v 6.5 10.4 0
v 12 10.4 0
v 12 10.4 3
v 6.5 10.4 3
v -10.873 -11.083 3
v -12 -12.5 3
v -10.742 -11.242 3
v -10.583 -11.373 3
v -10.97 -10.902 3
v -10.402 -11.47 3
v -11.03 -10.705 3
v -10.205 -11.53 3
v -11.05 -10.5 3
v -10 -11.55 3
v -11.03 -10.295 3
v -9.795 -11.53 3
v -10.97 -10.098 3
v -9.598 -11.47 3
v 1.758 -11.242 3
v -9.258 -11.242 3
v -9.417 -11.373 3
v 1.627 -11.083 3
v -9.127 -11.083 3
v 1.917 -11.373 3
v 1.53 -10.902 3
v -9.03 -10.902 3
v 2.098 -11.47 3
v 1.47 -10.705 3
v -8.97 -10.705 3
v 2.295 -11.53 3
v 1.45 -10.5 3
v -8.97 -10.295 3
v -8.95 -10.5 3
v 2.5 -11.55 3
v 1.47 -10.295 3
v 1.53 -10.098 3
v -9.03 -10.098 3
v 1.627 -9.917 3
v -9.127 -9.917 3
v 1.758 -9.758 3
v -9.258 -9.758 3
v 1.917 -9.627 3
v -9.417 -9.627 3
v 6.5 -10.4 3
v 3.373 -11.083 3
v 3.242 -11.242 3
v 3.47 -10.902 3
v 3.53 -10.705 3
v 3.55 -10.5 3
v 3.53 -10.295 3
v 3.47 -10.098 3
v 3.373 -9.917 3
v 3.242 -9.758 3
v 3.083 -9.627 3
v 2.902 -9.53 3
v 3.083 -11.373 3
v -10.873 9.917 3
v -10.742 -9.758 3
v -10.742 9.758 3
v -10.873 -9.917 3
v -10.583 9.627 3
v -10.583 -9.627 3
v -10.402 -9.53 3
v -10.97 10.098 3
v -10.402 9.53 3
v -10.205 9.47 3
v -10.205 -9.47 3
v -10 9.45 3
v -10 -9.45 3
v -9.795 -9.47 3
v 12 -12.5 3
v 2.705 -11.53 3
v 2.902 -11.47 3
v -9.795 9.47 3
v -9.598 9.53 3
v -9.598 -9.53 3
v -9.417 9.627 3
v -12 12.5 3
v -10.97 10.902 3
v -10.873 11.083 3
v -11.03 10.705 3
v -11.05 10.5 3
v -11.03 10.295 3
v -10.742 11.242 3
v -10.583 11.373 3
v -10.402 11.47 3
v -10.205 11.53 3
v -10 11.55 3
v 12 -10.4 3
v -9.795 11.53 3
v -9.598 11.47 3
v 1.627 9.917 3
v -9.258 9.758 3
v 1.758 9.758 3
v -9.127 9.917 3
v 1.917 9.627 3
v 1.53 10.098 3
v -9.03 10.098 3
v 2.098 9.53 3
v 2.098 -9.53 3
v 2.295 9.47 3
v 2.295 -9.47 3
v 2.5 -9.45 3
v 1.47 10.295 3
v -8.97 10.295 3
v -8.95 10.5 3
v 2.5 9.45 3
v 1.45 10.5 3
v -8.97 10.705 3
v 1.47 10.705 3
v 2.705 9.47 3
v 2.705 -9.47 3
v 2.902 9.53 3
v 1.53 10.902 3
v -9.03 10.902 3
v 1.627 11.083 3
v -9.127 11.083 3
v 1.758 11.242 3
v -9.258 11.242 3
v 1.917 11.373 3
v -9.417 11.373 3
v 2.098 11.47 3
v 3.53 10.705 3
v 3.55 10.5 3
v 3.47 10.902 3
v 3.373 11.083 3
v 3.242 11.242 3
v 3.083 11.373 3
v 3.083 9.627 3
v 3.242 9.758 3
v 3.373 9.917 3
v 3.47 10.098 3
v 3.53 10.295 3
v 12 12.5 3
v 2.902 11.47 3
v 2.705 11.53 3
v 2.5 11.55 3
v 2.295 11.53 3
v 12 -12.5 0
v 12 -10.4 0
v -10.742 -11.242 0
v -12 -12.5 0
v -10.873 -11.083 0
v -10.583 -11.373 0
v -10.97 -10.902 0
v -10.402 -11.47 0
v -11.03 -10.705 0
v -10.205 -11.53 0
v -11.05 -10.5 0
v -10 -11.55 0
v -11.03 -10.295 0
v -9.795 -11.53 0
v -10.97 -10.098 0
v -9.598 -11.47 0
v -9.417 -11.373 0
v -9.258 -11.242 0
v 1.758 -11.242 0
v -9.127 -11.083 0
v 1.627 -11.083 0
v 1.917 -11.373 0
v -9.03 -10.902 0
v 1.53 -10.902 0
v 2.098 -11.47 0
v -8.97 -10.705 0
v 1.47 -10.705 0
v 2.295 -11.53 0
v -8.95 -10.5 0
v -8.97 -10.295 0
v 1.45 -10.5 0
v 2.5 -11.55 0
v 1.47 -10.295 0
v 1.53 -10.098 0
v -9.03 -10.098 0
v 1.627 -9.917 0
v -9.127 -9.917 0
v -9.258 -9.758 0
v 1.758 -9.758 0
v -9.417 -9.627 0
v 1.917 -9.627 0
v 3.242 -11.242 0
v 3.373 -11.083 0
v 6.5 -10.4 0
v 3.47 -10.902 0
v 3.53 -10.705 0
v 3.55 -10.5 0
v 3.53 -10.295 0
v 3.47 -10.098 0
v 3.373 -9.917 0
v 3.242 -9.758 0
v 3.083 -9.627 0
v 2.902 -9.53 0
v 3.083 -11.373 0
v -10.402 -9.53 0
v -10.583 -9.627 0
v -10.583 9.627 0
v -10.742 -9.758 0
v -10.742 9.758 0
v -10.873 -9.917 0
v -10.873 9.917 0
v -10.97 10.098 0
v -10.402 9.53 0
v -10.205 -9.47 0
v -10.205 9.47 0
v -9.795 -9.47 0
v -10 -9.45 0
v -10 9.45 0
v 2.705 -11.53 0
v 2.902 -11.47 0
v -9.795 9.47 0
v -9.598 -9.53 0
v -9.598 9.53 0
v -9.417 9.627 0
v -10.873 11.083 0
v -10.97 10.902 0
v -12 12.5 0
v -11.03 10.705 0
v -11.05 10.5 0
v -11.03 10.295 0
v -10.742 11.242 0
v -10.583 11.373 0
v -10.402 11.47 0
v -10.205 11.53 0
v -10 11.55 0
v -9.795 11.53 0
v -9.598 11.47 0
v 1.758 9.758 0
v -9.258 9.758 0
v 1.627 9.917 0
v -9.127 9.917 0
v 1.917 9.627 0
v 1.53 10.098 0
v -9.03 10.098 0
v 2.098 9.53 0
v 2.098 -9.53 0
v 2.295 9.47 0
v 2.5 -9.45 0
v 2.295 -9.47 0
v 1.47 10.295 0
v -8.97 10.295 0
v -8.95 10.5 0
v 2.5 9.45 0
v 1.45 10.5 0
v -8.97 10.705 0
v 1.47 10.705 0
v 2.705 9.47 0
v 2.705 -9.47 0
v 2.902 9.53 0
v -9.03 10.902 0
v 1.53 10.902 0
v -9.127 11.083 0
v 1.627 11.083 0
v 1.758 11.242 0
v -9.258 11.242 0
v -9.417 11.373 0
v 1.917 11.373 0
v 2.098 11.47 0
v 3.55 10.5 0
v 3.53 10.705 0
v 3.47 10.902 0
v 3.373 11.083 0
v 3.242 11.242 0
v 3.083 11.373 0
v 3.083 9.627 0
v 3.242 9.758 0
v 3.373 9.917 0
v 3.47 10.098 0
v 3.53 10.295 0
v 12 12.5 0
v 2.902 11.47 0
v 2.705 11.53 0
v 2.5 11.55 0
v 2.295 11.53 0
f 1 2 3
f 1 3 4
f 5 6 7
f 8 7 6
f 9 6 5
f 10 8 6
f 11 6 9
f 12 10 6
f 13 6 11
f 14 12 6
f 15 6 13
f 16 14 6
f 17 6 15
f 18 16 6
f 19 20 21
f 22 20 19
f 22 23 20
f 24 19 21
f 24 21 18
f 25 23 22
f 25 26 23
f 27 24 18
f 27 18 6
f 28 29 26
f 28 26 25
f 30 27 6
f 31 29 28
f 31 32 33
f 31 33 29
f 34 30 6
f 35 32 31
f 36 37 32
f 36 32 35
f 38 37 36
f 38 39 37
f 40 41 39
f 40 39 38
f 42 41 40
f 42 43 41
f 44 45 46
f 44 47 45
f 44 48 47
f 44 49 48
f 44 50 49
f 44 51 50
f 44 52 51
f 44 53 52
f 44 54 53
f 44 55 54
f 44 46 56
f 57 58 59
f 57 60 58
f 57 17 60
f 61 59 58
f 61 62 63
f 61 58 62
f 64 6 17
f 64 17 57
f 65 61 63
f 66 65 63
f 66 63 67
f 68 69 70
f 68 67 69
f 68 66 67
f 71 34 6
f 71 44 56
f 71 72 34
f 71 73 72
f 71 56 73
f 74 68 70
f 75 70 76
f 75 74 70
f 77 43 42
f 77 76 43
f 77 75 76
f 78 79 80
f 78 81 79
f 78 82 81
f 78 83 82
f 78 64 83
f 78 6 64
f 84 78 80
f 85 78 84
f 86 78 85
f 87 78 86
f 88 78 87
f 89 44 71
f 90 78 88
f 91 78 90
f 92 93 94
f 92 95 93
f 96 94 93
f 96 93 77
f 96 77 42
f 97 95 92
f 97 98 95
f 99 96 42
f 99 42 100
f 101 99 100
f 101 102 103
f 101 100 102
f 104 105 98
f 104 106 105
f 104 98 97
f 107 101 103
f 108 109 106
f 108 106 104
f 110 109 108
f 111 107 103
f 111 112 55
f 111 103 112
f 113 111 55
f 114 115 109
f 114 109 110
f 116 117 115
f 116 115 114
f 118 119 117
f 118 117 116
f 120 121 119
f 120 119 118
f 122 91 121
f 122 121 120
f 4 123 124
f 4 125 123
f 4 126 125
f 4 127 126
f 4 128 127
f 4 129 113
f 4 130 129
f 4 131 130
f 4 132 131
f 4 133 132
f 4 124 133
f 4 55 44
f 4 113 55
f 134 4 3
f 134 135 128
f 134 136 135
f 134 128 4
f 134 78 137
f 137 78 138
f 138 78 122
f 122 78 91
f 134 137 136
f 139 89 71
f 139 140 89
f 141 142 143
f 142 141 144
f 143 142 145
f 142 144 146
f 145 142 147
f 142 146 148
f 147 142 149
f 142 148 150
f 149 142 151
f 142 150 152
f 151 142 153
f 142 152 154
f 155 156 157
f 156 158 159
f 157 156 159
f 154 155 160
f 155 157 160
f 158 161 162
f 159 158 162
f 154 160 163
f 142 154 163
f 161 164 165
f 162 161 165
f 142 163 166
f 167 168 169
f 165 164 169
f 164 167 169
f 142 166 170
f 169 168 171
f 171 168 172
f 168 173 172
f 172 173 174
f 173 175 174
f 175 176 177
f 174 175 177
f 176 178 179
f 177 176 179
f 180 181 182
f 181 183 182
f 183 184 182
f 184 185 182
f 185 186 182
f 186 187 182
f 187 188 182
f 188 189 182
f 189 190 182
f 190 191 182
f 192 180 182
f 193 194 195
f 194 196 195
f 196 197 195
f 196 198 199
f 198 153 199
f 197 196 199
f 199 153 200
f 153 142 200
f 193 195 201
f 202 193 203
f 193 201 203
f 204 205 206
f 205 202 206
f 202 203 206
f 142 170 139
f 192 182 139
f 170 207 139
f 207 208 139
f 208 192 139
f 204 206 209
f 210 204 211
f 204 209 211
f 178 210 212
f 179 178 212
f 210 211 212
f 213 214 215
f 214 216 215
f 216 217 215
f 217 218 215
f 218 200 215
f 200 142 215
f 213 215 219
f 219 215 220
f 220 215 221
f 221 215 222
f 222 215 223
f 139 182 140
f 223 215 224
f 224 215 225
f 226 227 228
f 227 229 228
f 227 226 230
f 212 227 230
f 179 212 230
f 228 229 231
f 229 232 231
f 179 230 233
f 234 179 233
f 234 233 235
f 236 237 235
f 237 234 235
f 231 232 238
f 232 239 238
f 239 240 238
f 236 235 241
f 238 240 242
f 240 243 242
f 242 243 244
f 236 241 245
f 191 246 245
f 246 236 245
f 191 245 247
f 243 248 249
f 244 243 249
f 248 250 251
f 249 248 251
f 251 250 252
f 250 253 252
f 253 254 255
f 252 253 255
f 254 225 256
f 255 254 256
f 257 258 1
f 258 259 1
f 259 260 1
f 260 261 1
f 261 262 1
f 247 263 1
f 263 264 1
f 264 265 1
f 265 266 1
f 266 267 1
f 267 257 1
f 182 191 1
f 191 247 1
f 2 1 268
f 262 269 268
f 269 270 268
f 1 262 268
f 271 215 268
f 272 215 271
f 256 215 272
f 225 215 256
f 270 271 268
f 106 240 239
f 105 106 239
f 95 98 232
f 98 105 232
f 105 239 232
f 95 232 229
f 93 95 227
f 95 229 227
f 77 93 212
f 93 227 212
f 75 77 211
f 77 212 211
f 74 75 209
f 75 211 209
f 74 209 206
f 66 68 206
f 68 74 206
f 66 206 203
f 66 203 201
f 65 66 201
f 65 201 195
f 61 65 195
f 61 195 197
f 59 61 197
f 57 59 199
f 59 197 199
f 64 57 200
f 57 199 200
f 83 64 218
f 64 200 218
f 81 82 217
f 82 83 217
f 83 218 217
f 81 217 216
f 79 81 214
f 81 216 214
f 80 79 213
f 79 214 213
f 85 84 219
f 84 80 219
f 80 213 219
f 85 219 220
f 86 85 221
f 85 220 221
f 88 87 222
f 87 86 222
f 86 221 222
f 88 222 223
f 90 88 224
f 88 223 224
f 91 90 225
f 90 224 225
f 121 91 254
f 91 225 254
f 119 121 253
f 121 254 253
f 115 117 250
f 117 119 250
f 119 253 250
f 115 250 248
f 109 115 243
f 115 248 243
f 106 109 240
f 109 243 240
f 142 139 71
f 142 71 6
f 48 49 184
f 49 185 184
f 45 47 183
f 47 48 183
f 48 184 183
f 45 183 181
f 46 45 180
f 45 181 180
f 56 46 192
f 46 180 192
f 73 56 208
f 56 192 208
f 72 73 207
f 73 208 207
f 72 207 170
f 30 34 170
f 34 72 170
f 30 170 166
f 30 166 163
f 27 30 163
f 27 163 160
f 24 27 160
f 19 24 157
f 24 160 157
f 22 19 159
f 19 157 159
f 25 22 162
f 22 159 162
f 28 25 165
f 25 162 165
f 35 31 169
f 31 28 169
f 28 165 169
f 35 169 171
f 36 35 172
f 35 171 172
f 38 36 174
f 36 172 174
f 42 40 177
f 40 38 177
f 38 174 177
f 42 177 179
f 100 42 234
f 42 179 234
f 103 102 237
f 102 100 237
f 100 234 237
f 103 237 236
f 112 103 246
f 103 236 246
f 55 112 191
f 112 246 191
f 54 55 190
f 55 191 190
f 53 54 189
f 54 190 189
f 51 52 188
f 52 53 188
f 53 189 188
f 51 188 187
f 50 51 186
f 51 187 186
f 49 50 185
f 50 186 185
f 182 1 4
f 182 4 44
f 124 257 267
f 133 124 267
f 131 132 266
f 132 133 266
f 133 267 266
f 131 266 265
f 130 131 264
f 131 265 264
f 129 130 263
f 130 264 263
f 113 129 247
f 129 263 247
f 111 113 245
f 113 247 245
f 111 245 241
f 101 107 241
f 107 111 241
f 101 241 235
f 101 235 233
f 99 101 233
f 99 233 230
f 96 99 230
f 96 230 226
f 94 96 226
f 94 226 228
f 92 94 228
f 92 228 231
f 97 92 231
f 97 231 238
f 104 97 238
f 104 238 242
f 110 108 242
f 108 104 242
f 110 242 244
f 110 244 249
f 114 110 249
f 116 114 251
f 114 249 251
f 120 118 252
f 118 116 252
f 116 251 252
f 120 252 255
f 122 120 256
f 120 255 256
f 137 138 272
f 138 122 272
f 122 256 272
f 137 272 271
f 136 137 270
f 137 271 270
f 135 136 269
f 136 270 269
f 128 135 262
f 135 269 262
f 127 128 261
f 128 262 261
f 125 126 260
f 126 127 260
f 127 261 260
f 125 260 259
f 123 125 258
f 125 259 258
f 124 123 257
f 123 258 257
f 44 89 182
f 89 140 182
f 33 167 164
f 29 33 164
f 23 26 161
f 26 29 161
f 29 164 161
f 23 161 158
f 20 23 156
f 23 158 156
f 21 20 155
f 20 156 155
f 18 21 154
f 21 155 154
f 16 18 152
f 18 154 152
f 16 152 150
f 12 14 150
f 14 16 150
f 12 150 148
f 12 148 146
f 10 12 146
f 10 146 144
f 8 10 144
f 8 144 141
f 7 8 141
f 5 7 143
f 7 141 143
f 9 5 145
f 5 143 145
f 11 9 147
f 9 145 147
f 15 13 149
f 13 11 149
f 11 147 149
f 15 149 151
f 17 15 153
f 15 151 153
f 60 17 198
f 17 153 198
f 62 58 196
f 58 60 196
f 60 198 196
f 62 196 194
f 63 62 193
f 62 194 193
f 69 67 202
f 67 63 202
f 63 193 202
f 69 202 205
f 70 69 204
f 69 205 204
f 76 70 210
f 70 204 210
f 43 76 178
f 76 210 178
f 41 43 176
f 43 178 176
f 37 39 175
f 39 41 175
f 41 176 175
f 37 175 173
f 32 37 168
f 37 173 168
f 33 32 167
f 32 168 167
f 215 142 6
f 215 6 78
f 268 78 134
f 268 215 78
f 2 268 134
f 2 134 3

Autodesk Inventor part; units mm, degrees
ref_plane "YZ Plane" through (0, 0, 0) normal (1, 0, 0) x (0, 1, 0)
ref_plane "XZ Plane" through (0, 0, 0) normal (0, 1, 0) x (-1, 0, 0)
ref_plane "XY Plane" through (0, 0, 0) normal (0, 0, 1) x (1, 0, 0)
sketch "Sketch1" plane through (0, 0, 0) normal (0, 0, 1) x (1, 0, 0)
  line L0 (-12, 12.5) -> (12, 12.5)
  line L1 (12, -12.5) -> (-12, -12.5)
  line L2 (-12, -12.5) -> (-12, 12.5)
  line L3 (-12, 12.5) -> (12, -12.5) construction
  line L4 (12, 12.5) -> (-12, -12.5) construction
  circle A0 centre (-10, 10.5) radius 1.05
  circle A1 centre (-10, -10.5) radius 1.05
  circle A2 centre (2.5, 10.5) radius 1.05
  circle A3 centre (2.5, -10.5) radius 1.05
  line L5 (12, -10.4) -> (6.5, -10.4)
  line L6 (12, 10.4) -> (6.5, 10.4)
  line L7 (6.5, 10.4) -> (6.5, -10.4)
  line L8 (12, 12.5) -> (12, 10.4)
  line L9 (12, -10.4) -> (12, -12.5)
  point P0 (0, 0)
  dimension "d0" = 24
  dimension "d1" = 25
  dimension "d2" = 2.1
  dimension "d3" = 2
  dimension "d4" = 2
  dimension "d5" = 2.1
  dimension "d6" = 2
  dimension "d7" = 2
  dimension "d8" = 2.1
  dimension "d10" = 2
  dimension "d11" = 2.1
  dimension "d12" = 2
  dimension "d14" = 5.5
  dimension "d16" = 2.1
  dimension "d17" = 2.1
  dimension "d18" = 20.8
  dimension "d19" = 9.5
  dimension "d20" = 9.5
extrude "Extrusion1" add sketch "Sketch1" along normal blind 3
equation "\"d17\" = d16"
properties part number "Camera-Holder_Camera-Base"
